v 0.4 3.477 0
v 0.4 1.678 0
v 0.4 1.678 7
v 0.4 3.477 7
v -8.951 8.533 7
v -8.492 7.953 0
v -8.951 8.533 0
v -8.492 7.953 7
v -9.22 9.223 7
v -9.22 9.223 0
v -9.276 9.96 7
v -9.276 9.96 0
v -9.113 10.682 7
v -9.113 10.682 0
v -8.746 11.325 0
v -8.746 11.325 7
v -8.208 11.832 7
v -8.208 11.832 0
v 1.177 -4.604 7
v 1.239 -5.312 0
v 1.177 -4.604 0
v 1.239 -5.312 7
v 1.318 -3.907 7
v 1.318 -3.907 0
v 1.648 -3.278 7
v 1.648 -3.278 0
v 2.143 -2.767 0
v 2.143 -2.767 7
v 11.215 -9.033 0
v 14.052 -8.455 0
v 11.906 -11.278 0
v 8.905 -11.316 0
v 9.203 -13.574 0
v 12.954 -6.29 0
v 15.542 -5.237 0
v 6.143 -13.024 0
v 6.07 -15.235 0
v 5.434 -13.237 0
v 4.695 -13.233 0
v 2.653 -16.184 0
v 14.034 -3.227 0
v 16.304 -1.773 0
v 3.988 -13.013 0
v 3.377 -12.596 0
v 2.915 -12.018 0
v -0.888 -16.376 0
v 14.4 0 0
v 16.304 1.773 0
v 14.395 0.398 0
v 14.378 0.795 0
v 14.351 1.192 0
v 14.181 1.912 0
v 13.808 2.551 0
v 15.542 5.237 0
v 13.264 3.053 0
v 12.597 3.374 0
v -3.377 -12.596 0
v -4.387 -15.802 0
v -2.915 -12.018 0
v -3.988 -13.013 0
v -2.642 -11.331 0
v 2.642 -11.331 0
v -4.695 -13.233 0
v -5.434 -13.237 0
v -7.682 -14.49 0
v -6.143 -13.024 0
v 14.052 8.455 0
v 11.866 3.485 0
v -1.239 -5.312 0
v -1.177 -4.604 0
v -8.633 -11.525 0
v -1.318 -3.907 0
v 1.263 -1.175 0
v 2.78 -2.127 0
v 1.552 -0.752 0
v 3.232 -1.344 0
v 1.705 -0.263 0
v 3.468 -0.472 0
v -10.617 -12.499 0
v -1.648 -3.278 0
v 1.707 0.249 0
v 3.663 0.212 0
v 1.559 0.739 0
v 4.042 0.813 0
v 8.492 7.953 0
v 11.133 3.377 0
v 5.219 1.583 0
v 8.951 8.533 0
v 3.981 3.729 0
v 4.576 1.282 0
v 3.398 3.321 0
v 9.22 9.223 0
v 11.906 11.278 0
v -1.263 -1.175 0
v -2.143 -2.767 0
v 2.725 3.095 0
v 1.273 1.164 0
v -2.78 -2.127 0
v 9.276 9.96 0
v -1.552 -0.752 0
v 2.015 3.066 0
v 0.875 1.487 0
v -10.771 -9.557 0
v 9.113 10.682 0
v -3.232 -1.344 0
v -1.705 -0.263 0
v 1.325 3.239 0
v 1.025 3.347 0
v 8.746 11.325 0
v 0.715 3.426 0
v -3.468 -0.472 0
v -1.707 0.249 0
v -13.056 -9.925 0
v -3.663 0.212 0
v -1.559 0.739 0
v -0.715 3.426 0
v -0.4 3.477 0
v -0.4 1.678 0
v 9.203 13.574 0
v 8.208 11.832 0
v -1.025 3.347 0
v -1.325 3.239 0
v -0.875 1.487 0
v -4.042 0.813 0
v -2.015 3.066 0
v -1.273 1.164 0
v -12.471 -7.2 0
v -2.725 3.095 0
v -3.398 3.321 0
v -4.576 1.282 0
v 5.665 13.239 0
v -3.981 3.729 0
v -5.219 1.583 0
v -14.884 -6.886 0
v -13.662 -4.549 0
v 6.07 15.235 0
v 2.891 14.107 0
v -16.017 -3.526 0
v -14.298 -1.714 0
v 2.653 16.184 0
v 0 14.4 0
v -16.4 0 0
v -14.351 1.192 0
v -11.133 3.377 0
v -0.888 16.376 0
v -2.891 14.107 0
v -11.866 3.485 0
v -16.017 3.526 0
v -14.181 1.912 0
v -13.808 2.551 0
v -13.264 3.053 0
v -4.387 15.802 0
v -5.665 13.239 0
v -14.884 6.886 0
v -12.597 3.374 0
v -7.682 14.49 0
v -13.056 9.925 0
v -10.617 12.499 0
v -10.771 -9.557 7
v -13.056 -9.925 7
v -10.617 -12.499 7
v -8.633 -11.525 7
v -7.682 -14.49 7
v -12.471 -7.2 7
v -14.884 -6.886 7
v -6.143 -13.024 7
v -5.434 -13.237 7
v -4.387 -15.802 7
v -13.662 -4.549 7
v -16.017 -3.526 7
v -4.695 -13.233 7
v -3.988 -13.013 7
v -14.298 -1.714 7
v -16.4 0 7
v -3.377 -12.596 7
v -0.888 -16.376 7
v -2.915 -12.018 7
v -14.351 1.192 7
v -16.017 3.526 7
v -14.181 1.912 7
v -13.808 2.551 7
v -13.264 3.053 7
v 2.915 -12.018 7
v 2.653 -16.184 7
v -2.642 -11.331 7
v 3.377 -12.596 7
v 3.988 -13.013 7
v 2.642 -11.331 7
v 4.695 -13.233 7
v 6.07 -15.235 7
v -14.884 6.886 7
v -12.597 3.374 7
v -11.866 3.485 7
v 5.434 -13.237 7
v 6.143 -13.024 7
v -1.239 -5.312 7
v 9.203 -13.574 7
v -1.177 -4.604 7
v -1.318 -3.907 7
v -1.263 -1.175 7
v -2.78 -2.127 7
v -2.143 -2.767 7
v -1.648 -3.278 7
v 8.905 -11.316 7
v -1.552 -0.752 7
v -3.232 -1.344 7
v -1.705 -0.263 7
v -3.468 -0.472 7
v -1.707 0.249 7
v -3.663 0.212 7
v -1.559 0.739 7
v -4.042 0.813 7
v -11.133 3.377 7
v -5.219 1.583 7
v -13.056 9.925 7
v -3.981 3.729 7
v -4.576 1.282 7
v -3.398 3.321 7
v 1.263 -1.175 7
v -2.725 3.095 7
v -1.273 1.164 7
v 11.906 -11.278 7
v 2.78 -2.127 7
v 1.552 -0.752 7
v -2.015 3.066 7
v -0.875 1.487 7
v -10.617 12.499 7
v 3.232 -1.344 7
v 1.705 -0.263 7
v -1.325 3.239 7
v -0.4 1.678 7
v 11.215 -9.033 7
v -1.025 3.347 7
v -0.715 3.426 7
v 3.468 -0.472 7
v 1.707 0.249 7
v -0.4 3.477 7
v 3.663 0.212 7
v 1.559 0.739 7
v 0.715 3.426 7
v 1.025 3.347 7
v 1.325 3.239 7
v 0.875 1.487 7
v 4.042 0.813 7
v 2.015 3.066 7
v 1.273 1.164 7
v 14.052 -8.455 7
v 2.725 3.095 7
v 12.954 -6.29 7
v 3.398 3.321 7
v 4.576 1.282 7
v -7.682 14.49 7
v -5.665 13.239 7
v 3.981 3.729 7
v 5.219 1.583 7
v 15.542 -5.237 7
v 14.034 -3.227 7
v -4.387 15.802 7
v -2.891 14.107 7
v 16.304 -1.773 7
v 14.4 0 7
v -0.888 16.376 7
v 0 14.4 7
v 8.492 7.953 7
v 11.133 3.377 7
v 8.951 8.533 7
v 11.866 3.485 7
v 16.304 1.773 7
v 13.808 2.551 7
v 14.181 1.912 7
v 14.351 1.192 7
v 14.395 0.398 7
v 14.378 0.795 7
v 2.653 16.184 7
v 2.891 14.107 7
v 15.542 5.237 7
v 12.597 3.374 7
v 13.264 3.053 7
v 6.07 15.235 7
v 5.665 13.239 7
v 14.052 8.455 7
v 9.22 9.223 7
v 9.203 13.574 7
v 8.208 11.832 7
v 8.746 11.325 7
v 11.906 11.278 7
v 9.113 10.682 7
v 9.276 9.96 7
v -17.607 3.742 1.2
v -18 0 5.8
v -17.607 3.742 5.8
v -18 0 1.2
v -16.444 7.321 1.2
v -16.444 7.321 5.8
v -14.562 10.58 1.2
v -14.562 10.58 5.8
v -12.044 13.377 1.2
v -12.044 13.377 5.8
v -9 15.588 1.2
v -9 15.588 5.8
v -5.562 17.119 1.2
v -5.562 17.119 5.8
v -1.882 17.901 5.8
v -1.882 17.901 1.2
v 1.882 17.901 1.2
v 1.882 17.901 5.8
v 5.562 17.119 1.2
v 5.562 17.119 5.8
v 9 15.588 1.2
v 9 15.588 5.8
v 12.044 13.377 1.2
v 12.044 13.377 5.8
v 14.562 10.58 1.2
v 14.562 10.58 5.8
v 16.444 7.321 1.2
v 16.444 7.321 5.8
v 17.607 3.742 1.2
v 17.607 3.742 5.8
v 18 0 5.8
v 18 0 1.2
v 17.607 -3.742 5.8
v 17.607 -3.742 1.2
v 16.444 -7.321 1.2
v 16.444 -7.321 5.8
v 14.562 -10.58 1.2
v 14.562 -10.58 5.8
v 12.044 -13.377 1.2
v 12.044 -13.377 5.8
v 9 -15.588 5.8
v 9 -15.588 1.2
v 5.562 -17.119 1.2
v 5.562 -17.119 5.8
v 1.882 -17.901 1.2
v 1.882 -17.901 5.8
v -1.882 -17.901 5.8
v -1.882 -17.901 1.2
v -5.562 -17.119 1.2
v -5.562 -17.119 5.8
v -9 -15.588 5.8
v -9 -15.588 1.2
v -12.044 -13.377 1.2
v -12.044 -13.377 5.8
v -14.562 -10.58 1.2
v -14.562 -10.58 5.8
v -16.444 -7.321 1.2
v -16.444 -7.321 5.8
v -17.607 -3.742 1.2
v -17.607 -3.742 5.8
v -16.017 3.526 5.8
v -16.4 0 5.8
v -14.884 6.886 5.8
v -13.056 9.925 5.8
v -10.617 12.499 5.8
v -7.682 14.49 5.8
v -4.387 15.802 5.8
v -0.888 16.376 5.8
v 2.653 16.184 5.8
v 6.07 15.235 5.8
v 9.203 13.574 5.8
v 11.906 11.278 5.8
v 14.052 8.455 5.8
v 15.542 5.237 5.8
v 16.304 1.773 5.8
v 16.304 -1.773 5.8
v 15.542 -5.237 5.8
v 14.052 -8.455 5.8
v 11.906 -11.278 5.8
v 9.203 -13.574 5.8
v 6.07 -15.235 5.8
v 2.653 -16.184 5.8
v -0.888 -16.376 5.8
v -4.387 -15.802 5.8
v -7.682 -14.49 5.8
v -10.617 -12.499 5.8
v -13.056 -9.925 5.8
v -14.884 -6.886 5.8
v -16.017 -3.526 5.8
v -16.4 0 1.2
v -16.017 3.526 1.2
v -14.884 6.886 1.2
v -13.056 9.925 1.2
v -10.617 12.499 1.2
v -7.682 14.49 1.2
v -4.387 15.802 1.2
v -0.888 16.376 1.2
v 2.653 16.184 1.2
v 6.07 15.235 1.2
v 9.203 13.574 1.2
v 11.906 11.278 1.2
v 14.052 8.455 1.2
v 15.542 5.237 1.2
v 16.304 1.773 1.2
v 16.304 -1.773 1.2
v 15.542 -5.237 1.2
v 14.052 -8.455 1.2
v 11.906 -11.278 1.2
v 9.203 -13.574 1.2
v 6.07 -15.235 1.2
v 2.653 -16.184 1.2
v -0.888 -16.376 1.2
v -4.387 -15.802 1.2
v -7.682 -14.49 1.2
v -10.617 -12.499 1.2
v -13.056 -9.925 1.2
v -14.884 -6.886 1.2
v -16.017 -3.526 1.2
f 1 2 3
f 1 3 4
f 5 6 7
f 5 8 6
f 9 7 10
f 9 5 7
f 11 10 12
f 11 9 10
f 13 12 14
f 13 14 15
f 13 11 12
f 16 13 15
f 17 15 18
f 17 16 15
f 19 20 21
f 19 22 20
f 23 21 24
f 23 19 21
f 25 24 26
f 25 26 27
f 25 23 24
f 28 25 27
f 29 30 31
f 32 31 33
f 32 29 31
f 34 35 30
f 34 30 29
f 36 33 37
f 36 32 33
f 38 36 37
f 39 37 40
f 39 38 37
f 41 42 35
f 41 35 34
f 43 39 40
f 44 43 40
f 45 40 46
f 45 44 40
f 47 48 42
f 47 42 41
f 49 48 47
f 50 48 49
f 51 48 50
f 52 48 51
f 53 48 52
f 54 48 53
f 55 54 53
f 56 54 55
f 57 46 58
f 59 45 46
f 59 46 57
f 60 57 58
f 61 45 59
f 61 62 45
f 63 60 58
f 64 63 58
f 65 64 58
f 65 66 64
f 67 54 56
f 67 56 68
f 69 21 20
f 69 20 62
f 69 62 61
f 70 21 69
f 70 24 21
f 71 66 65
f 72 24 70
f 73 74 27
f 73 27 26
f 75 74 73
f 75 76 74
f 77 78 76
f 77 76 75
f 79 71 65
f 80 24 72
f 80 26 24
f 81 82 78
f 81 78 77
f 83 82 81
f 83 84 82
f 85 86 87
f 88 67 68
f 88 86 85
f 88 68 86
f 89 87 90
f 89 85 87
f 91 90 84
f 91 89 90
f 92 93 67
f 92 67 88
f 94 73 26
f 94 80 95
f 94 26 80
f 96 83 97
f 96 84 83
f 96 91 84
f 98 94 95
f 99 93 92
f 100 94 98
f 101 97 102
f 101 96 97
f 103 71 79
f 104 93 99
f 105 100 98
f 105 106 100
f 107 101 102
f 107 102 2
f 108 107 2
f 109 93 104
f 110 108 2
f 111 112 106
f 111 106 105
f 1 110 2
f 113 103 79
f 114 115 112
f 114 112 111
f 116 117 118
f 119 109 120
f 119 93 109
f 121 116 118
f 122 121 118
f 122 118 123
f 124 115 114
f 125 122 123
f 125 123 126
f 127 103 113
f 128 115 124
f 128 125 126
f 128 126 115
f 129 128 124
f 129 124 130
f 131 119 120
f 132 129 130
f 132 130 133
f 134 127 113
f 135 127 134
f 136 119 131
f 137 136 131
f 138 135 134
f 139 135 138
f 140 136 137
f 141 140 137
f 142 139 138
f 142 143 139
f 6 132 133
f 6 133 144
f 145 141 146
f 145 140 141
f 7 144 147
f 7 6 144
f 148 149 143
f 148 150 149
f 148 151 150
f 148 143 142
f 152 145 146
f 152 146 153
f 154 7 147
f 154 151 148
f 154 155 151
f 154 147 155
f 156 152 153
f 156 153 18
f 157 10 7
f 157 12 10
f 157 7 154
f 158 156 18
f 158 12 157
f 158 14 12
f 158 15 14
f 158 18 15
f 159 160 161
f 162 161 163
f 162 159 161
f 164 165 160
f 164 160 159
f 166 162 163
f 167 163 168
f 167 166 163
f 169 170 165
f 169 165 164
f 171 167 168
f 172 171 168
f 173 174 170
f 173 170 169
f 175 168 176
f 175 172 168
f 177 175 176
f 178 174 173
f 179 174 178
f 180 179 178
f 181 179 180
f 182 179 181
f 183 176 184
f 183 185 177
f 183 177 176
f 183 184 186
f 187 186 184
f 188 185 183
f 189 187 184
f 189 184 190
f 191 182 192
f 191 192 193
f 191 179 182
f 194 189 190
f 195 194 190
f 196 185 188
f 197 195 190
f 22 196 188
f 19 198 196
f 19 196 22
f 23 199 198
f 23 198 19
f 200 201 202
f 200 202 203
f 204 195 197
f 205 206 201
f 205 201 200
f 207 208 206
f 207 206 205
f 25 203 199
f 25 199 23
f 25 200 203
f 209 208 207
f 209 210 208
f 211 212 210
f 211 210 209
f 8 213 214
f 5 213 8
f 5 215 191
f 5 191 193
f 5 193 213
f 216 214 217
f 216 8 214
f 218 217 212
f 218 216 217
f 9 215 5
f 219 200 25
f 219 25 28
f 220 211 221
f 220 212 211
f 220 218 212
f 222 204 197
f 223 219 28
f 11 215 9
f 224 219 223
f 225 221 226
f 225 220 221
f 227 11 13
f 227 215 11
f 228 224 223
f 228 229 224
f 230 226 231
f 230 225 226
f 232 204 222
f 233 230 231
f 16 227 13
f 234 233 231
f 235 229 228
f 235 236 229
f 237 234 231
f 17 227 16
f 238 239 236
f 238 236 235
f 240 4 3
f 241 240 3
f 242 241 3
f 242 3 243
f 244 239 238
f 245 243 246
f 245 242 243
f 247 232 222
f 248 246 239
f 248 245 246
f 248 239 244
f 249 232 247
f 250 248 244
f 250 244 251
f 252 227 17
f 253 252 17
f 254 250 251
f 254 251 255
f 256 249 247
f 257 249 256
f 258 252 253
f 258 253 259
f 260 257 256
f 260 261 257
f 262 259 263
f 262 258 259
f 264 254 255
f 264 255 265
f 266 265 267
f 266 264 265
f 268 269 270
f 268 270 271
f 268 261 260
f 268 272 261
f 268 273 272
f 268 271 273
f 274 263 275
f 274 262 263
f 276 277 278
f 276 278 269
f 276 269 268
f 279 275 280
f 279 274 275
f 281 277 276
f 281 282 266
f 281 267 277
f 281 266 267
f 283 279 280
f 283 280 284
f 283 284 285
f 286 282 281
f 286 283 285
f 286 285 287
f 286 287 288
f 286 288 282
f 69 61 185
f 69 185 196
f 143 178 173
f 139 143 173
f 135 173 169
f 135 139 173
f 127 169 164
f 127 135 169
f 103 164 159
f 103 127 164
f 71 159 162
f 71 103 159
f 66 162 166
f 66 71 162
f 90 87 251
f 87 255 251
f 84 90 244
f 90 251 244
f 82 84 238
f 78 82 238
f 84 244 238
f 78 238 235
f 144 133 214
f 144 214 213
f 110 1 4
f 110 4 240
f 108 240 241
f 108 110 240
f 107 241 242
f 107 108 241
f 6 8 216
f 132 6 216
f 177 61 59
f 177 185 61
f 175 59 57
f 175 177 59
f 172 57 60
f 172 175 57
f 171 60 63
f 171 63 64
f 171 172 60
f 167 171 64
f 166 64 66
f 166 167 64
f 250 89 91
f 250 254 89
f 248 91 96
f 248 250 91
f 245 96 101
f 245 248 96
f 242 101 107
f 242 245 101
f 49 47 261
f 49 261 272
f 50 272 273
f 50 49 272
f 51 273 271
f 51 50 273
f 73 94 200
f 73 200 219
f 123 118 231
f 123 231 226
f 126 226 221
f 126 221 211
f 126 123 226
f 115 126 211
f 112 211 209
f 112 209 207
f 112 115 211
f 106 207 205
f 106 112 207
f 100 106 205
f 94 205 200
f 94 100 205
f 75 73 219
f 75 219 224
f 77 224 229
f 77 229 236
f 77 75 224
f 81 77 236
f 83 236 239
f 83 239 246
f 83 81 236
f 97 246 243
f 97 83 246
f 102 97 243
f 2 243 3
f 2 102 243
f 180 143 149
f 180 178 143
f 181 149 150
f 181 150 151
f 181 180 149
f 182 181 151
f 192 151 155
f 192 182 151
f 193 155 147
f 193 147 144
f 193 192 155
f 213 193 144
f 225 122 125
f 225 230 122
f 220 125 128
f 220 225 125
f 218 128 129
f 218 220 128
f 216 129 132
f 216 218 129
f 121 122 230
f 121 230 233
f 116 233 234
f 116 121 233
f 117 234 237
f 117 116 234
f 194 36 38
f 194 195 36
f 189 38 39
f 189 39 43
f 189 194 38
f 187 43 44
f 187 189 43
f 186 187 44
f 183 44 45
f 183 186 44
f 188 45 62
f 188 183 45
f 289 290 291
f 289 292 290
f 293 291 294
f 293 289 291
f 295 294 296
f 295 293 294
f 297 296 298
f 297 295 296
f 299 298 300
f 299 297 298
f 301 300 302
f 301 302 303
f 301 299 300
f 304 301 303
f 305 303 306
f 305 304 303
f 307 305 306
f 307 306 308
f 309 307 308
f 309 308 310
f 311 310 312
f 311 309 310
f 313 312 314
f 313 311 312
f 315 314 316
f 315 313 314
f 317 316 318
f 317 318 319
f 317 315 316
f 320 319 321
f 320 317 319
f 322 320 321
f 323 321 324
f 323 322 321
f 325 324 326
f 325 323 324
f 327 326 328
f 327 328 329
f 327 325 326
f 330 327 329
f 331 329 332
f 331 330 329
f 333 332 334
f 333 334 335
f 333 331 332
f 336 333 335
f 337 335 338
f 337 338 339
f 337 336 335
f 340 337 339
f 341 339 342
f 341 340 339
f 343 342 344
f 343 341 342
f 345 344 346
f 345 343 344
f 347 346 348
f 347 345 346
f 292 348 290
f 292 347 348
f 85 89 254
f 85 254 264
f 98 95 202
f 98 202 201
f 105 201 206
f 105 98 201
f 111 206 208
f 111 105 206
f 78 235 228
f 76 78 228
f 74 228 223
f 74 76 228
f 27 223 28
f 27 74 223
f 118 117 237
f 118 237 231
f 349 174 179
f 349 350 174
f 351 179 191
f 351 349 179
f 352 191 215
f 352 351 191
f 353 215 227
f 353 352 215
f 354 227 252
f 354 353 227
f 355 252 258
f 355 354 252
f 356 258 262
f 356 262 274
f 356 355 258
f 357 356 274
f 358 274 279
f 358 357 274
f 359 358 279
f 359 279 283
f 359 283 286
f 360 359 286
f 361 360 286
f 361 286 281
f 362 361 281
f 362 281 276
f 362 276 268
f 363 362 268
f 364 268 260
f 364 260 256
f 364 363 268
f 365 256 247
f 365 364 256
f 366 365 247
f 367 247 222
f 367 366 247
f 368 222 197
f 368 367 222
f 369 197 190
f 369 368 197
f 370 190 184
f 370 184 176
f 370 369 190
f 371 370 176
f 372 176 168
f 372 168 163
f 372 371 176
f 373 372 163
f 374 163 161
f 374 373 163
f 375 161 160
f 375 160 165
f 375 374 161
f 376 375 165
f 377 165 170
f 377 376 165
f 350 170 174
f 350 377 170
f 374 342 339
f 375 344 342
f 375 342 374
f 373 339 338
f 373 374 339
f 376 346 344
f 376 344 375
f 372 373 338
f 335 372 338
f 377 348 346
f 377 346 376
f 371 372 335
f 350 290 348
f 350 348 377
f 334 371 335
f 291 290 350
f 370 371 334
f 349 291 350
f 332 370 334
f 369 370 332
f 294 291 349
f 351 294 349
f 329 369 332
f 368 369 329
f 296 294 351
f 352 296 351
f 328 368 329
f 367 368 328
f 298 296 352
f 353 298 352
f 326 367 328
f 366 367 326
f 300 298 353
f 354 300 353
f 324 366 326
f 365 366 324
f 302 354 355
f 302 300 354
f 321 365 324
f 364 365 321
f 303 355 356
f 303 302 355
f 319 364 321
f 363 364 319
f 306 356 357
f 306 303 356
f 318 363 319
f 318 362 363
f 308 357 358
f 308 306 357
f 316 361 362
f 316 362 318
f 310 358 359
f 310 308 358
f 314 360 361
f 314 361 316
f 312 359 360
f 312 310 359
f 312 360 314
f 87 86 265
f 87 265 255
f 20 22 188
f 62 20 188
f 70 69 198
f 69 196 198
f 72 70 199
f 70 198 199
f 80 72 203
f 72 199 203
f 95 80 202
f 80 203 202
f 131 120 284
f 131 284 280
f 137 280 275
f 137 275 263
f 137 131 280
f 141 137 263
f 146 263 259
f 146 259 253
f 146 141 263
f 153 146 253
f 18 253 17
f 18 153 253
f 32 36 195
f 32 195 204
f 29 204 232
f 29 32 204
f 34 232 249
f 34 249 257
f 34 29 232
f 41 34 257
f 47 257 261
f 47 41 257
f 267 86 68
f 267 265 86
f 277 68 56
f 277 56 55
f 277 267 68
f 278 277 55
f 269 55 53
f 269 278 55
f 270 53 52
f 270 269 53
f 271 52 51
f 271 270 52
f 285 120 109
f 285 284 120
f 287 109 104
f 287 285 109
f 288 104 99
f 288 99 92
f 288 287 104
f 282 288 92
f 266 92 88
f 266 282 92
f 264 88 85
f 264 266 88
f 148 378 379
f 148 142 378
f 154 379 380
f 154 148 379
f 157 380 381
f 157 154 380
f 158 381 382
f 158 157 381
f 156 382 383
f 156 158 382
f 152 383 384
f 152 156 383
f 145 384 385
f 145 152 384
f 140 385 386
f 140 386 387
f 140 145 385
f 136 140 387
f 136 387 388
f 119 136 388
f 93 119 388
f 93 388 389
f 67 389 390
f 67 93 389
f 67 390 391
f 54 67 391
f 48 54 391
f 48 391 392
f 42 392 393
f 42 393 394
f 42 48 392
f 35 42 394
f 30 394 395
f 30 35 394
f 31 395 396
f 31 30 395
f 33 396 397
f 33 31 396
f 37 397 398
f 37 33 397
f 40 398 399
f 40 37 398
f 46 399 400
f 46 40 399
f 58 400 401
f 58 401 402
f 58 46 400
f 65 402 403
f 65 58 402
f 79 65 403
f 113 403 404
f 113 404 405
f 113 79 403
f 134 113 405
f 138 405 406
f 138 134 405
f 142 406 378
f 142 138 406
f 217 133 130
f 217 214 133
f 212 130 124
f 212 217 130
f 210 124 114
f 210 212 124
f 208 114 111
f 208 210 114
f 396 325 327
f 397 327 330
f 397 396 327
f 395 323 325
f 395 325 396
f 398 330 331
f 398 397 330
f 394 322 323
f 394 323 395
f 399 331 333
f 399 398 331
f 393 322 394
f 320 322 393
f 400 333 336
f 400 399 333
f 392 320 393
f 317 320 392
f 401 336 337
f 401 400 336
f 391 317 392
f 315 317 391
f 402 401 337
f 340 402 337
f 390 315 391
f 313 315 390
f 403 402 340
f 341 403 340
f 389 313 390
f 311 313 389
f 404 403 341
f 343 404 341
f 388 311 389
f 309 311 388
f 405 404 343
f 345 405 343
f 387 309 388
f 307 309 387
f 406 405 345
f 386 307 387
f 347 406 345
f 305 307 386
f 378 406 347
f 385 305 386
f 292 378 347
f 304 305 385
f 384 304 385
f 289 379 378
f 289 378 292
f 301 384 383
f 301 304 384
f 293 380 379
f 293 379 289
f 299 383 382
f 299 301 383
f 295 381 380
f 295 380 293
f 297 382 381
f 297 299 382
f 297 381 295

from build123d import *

# Parameters (mm, degrees)
F3_DEPTH = 7
F4_R     = 2.5


with BuildPart() as f1:
    # F0 (on Front) → F1 (revolve)
    with BuildSketch(Plane.XZ):
        Polygon((-16.4, 0), (0, 0), (0, 7), (-16.4, 7), (-16.4, 5.8), (-18, 5.8), (-18, 1.2), (-16.4, 1.2), align=None)
    revolve(axis=Axis((0, 0, 3.5), (0, 0, -1)))

    # F2 (on Top) → F3 (cut, through all)
    with BuildSketch(Plane.XY):
        with BuildLine():
            Line((-0.4, 3.477068), (-0.4, 1.677982))
            ThreePointArc((-0.4, 1.677982), (-1.651125, 0.499411), (-1.262933, -1.175))
            Line((-1.262933, -1.175), (1.262933, -1.175))
            ThreePointArc((1.262933, -1.175), (1.651125, 0.499411), (0.4, 1.677982))
            Line((0.4, 1.677982), (0.4, 3.477068))
            ThreePointArc((0.4, 3.477068), (1.573642, 3.126284), (2.55453, 2.392567))
            Line((2.55453, 2.392567), (10.510067, 9.843703))
            ThreePointArc((10.510067, 9.843703), (0, 14.4), (-10.510067, 9.843703))
            Line((-10.510067, 9.843703), (-2.55453, 2.392567))
            ThreePointArc((-2.55453, 2.392567), (-1.573642, 3.126284), (-0.4, 3.477068))
        make_face()
        with BuildLine():
            ThreePointArc((3.349289, 1.016005), (3.031089, -1.75), (0.794758, -3.408571))
            Line((0.794758, -3.408571), (3.269863, -14.023837))
            ThreePointArc((3.269863, -14.023837), (11.279318, -8.951926), (14.4, 0))
            ThreePointArc((14.4, 0), (14.244139, 2.112937), (13.77993, 4.180134))
            Line((13.77993, 4.180134), (3.349289, 1.016005))
        make_face()
        with BuildLine():
            ThreePointArc((-0.794758, -3.408571), (-3.031089, -1.75), (-3.349289, 1.016005))
            Line((-3.349289, 1.016005), (-13.77993, 4.180134))
            ThreePointArc((-13.77993, 4.180134), (-12.470766, -7.2), (-3.269863, -14.023837))
            Line((-3.269863, -14.023837), (-0.794758, -3.408571))
        make_face()
    extrude(amount=F3_DEPTH, mode=Mode.SUBTRACT)

    # F4
    f4_edges = [f1.edges().sort_by_distance(p)[0] for p in [
        (-3.349289, 1.016005, 3.5),
        (-0.794758, -3.408571, 3.5),
        (0.794758, -3.408571, 3.5),
        (3.349289, 1.016005, 3.5),
        (-2.55453, 2.392567, 3.5),
        (2.55453, 2.392567, 3.5),
        (-10.510067, 9.843703, 3.5),
        (10.510067, 9.843703, 3.5),
        (13.77993, 4.180134, 3.5),
        (3.269863, -14.023837, 3.5),
        (-3.269863, -14.023837, 3.5),
        (-13.77993, 4.180134, 3.5),
    ]]
    fillet(f4_edges, radius=F4_R)


solid = f1.part
